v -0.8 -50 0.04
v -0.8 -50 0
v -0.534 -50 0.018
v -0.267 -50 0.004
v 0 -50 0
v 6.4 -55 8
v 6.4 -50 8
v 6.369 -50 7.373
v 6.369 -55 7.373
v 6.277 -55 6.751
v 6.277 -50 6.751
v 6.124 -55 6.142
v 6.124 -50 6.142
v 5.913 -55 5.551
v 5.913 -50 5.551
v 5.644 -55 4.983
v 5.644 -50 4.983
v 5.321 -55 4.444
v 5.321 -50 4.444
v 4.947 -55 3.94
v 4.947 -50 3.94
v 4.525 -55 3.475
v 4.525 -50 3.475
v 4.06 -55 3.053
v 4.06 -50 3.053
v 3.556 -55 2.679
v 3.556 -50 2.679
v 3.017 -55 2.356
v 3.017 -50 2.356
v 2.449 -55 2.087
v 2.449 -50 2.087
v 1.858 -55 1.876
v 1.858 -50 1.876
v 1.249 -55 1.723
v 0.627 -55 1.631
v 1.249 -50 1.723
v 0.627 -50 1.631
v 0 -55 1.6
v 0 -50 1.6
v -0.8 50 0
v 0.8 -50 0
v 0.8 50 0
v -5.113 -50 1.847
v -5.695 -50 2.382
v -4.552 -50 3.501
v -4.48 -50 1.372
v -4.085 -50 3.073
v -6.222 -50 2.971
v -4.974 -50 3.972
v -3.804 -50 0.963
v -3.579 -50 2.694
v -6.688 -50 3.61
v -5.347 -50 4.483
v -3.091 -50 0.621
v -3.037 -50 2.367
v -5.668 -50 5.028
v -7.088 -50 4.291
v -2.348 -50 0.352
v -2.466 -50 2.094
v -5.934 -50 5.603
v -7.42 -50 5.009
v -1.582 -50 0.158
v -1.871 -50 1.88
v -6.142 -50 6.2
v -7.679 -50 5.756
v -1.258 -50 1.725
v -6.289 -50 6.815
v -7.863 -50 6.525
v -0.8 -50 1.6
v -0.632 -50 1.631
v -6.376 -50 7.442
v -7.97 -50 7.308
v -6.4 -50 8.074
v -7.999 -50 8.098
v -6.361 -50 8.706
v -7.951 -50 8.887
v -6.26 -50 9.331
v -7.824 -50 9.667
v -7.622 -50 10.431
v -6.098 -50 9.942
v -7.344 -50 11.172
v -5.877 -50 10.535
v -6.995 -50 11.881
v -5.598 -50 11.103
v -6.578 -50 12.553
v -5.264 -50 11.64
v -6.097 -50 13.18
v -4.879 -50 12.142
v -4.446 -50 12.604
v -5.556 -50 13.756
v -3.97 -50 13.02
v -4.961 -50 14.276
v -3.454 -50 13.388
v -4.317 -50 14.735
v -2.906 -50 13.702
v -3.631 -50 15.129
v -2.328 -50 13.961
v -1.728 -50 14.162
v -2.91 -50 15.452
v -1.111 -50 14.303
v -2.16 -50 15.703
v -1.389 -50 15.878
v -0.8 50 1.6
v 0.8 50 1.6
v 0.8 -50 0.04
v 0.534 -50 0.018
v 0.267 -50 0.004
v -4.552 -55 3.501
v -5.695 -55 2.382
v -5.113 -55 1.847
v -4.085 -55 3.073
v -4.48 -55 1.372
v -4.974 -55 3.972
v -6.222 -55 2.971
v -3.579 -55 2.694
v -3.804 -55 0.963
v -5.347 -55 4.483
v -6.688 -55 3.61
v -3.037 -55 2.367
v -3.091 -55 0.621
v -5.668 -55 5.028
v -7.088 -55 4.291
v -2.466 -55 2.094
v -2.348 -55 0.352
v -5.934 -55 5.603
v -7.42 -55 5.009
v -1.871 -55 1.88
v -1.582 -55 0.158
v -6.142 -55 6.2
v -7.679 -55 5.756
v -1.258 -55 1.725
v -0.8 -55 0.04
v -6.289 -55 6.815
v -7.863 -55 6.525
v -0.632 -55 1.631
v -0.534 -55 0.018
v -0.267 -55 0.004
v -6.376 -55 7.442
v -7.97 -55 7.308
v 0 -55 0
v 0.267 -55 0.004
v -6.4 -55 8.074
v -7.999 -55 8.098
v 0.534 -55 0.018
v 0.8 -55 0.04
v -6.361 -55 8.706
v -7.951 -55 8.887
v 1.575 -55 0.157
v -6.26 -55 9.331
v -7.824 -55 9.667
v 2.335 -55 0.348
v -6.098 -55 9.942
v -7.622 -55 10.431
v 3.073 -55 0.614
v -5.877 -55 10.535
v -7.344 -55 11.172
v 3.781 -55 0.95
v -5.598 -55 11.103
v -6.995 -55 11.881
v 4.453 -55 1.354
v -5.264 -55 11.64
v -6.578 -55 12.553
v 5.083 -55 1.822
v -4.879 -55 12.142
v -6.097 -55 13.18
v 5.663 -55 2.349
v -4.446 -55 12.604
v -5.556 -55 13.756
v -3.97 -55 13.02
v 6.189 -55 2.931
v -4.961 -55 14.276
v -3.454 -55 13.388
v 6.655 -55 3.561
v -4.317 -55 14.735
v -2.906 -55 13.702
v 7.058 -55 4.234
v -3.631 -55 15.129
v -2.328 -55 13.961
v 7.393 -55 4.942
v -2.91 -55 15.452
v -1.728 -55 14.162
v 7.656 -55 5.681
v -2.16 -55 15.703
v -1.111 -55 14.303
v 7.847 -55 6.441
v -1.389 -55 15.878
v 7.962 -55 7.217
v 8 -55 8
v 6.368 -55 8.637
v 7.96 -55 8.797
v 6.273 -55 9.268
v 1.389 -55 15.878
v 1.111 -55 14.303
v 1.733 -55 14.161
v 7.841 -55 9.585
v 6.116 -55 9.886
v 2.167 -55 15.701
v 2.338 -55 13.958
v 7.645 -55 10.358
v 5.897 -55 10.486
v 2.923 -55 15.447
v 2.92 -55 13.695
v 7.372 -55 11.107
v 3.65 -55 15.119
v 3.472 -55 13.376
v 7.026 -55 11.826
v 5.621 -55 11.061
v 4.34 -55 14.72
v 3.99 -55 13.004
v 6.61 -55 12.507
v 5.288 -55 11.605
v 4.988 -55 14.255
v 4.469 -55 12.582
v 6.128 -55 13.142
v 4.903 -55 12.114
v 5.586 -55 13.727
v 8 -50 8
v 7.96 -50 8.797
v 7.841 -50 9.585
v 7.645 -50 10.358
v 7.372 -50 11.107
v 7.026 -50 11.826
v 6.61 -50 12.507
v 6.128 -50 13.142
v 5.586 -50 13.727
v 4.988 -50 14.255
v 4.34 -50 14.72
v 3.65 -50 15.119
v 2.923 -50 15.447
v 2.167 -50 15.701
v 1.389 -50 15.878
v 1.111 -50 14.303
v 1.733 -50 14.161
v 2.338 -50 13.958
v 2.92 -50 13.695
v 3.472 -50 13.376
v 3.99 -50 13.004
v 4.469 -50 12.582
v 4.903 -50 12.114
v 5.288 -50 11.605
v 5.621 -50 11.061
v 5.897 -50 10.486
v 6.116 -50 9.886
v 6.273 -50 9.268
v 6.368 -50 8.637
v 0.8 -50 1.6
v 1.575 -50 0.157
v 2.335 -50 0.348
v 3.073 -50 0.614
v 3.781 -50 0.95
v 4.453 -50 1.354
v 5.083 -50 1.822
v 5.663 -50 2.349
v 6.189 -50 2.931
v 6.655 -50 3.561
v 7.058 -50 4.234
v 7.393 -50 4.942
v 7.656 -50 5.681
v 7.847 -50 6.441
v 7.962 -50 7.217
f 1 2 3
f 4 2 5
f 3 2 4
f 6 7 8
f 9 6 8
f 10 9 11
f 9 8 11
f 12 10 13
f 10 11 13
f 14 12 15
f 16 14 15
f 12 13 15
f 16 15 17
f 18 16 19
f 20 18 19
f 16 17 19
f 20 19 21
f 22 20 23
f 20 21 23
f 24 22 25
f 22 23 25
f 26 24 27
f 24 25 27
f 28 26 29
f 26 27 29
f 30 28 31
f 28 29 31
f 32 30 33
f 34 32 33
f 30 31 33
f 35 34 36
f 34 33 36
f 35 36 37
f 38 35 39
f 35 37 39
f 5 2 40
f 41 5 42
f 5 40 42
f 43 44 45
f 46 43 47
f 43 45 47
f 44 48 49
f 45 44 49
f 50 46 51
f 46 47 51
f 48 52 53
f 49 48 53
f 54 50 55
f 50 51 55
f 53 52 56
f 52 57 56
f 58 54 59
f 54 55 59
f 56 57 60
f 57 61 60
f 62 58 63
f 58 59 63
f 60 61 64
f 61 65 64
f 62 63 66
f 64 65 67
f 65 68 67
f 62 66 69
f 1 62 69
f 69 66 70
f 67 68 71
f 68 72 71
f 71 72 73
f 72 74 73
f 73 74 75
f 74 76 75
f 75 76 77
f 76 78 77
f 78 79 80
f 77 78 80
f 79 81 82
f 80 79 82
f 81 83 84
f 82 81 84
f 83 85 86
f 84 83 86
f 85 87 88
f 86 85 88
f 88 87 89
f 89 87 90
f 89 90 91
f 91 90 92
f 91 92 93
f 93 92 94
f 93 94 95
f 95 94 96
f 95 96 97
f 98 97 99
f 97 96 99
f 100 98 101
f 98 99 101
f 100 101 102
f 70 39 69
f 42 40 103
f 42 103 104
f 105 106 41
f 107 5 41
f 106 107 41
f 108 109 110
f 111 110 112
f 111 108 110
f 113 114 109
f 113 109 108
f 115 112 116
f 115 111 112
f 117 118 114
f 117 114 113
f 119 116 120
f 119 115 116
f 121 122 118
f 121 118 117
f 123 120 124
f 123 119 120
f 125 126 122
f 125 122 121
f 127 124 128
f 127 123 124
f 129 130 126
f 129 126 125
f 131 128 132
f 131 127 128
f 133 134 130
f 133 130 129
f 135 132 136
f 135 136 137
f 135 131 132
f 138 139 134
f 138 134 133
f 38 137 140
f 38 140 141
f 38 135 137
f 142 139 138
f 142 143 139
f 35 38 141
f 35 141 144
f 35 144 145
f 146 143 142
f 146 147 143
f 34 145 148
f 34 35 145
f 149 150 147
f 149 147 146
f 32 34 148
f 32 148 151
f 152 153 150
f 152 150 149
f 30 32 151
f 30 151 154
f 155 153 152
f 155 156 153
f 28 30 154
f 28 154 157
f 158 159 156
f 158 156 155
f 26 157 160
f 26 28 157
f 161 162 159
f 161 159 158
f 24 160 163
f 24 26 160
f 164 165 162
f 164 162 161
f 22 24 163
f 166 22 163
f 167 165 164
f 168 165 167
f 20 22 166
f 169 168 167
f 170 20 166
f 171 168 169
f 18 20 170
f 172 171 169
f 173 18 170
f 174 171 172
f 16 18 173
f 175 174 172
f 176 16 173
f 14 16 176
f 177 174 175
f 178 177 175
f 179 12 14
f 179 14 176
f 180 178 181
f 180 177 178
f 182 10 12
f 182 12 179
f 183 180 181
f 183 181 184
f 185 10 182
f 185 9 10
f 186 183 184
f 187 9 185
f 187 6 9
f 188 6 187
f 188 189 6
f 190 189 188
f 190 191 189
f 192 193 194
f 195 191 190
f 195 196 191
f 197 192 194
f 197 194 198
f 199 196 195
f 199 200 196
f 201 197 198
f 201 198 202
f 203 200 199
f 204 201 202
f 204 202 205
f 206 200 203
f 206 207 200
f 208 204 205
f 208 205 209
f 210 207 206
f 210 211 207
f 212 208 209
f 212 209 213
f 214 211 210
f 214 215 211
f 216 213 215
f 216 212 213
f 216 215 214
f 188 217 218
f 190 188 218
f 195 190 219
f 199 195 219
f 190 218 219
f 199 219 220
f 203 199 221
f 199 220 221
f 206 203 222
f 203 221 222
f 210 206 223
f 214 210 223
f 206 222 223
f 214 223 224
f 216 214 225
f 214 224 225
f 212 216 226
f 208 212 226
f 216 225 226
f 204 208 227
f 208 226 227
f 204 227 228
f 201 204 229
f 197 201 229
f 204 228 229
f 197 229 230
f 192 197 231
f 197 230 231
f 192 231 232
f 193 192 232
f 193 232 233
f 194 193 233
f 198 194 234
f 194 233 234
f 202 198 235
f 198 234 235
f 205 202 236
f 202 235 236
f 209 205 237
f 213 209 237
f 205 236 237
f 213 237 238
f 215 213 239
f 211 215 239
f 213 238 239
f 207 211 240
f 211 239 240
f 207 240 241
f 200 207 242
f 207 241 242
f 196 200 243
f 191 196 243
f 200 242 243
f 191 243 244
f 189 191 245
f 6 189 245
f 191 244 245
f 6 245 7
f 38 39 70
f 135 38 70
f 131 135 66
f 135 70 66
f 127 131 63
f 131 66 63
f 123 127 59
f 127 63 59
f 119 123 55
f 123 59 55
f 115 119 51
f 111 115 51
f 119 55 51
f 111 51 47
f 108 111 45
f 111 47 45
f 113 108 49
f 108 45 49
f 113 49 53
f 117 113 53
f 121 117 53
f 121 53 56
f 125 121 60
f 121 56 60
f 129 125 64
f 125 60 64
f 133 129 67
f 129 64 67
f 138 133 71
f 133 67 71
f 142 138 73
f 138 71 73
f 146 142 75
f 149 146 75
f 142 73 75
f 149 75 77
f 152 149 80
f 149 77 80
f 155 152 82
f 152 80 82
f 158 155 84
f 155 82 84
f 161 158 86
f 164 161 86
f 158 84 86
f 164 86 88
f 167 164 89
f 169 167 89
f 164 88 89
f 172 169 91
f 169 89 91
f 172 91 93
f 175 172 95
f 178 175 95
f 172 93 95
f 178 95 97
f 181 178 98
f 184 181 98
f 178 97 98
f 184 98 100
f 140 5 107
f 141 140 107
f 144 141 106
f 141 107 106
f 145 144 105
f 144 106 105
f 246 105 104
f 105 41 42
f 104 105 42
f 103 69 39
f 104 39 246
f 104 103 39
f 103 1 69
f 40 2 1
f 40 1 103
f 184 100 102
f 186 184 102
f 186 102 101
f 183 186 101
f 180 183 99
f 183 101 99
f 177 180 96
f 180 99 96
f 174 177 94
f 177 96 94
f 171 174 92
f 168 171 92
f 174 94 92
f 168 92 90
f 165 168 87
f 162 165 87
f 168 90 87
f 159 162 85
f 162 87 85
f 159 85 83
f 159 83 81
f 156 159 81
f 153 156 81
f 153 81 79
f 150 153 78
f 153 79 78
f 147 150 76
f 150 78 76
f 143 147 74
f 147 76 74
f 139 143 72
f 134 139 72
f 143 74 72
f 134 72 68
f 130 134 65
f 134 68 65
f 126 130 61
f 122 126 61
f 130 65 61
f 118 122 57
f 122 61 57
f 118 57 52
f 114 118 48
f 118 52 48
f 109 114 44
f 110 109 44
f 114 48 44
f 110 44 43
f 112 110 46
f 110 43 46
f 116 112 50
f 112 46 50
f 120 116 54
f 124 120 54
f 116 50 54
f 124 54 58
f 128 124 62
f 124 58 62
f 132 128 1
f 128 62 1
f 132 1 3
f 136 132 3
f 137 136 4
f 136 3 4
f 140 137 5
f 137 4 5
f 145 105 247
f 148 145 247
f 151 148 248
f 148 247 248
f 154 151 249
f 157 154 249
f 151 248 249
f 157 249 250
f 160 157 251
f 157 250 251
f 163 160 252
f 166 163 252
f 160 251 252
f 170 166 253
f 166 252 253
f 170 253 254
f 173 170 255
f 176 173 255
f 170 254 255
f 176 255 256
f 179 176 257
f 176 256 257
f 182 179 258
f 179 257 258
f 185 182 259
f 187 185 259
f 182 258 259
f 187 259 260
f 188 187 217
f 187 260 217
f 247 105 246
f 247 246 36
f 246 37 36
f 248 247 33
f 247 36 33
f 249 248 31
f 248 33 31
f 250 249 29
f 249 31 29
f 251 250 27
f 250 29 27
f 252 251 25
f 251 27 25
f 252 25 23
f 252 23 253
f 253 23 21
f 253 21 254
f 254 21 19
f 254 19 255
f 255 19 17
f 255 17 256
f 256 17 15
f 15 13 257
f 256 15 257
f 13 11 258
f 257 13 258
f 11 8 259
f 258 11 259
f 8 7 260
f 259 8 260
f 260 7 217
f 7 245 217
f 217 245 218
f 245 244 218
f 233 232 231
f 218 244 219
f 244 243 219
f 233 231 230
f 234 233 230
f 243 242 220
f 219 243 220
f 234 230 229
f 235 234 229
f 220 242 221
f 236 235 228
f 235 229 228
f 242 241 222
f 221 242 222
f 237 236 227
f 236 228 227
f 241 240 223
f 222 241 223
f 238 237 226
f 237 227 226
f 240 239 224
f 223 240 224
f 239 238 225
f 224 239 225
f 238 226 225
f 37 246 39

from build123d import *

# Parameters (mm, degrees)
F0_W     = 1.6
F0_H     = 100
F1_DEPTH = 1.6
F3_DEPTH = 5


with BuildPart() as f1:
    # F0 (on Top) → F1 (new body)
    with BuildSketch(Plane.XY):
        Rectangle(F0_W, F0_H)
    extrude(amount=F1_DEPTH)

    # F2 (on face) → F3 (join)
    with BuildSketch(Plane.XZ.offset(50)):
        with BuildLine():
            Line((-1.111348, 14.30277), (-1.389185, 15.878462))
            ThreePointArc((-1.389185, 15.878462), (-7.99447, 7.702607), (-0.8, 0.040101))
            Line((-0.8, 0.040101), (-0.8, 1.6))
            Line((-0.8, 1.6), (0, 1.6))
            ThreePointArc((0, 1.6), (-6.375646, 7.442203), (-1.111348, 14.30277))
        make_face()
        with BuildLine():
            ThreePointArc((0.8, 0.040101), (5.932959, 2.633437), (8, 8))
            ThreePointArc((8, 8), (6.128356, 13.142301), (1.389185, 15.878462))
            Line((1.389185, 15.878462), (1.111348, 14.30277))
            ThreePointArc((1.111348, 14.30277), (4.902684, 12.113841), (6.4, 8))
            ThreePointArc((6.4, 8), (4.525483, 3.474517), (0, 1.6))
            Line((0, 1.6), (0.8, 1.6))
            Line((0.8, 1.6), (0.8, 0.040101))
        make_face()
        with BuildLine():
            ThreePointArc((0, 0), (0.400502, 0.010031), (0.8, 0.040101))
            Line((0.8, 0.040101), (0.8, 1.6))
            Line((0.8, 1.6), (0, 1.6))
            Line((0, 1.6), (-0.8, 1.6))
            Line((-0.8, 1.6), (-0.8, 0.040101))
            ThreePointArc((-0.8, 0.040101), (-0.400502, 0.010031), (0, 0))
        make_face()
    extrude(amount=F3_DEPTH)


solid = f1.part
